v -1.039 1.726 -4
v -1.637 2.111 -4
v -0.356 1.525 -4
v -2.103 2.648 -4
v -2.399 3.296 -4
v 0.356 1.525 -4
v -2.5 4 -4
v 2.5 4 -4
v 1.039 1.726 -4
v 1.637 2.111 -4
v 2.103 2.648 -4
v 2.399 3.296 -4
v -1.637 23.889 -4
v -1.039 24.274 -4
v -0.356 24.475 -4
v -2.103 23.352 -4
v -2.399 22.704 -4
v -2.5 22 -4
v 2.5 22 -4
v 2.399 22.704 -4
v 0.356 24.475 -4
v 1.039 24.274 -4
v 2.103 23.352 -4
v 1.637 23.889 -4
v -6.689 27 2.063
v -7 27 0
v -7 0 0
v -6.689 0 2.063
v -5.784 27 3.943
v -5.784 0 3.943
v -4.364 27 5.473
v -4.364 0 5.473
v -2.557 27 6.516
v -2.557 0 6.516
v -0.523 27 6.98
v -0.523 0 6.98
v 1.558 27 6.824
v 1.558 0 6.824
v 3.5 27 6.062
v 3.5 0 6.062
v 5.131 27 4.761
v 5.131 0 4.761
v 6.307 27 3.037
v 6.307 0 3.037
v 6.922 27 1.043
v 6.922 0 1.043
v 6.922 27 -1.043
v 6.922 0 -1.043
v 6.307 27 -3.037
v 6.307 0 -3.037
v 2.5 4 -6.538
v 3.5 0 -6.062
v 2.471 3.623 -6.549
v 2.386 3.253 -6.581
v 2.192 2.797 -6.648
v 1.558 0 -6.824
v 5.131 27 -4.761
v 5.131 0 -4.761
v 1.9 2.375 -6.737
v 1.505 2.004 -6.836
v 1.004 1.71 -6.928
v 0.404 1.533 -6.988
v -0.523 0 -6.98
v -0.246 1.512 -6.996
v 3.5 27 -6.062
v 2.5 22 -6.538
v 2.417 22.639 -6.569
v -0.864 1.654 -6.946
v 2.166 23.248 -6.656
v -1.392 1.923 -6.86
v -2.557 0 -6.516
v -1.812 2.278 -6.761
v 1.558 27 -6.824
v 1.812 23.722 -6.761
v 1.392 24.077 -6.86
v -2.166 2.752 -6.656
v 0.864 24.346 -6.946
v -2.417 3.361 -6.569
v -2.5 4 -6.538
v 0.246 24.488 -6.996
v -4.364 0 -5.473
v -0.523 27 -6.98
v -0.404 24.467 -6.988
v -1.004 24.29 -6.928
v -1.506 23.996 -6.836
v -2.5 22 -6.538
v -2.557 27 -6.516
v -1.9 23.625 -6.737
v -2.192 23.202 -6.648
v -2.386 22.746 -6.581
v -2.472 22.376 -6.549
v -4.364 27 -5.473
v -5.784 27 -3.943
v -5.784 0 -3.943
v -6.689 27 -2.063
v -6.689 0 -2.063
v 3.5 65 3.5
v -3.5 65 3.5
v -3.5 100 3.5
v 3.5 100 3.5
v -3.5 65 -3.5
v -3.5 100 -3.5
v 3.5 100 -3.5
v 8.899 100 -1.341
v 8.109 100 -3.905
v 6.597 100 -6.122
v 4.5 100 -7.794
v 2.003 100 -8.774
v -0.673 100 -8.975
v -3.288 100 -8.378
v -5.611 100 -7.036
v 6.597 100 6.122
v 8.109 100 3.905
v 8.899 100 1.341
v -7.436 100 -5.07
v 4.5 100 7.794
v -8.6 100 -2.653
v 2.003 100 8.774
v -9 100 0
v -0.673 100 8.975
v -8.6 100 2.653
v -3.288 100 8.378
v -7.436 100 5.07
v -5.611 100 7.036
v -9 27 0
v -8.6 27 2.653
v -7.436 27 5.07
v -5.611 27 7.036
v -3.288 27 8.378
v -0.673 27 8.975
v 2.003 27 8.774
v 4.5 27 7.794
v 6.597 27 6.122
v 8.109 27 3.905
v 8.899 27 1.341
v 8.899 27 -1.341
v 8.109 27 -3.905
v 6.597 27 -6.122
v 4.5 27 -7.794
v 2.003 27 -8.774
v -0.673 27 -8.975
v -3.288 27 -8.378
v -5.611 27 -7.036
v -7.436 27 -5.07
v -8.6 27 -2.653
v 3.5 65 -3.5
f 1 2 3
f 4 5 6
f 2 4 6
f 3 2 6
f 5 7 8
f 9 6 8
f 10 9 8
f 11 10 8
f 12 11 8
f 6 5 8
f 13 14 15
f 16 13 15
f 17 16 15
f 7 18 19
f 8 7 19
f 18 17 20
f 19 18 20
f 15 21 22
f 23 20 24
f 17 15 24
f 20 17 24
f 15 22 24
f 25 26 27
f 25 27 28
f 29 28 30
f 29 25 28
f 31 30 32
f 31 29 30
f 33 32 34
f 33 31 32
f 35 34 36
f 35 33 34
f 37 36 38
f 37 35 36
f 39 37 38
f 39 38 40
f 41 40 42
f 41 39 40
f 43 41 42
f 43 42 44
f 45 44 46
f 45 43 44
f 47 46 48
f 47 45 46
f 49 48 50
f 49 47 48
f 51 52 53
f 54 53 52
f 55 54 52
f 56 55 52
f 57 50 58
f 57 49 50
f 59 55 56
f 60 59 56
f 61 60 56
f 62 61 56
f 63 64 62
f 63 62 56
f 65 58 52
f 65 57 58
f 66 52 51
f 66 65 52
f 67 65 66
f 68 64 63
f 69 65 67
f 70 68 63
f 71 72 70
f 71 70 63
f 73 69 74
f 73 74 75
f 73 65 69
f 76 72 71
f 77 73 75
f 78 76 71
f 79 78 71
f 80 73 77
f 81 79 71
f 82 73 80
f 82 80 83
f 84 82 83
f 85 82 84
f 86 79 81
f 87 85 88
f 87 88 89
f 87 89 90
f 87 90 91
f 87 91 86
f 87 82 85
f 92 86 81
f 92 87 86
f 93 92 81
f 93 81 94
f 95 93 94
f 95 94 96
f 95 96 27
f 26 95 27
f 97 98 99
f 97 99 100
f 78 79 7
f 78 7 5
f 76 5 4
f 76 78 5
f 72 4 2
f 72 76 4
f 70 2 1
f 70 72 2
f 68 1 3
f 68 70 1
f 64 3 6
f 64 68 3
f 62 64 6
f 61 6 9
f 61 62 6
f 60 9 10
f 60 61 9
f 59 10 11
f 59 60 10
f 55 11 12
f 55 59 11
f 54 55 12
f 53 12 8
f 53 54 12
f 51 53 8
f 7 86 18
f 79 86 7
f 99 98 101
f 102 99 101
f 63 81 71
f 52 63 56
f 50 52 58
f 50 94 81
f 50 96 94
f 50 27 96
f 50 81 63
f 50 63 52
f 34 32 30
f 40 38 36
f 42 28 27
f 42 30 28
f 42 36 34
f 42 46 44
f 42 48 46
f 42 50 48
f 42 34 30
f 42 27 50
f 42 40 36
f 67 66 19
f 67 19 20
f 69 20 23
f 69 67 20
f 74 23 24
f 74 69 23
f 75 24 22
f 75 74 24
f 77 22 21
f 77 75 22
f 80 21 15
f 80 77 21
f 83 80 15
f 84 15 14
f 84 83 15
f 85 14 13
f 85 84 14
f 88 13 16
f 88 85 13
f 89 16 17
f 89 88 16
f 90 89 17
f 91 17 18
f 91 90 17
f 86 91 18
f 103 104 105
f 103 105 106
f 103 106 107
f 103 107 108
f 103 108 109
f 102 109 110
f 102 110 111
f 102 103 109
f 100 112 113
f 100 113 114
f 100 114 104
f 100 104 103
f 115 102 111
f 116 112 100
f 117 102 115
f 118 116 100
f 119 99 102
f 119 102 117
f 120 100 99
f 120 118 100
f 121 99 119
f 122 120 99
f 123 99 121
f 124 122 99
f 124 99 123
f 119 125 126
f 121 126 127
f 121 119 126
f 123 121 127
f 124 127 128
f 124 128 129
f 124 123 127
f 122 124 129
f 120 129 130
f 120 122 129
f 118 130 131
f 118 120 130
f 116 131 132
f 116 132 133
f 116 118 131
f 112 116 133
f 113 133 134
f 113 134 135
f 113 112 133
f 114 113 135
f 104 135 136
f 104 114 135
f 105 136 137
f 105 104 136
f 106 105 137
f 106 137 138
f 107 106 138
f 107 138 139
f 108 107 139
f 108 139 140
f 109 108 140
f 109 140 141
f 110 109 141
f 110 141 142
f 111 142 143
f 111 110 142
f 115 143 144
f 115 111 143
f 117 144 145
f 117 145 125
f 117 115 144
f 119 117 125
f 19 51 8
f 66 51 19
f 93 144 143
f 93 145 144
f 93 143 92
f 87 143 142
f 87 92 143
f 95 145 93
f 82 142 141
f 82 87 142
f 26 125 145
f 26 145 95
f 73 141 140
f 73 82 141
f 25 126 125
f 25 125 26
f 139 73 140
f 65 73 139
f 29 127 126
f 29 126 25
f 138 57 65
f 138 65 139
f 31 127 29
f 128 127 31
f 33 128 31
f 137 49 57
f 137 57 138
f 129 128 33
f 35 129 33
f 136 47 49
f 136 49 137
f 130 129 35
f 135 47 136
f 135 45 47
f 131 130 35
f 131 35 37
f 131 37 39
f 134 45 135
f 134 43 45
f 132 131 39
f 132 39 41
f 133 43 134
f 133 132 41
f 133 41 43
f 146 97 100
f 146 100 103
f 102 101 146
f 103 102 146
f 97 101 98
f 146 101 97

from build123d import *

# Parameters (mm, degrees)
SKETCH_2_W          = 7
SKETCH_2_H          = 7
CUT_EXTRUDE_1_DEPTH = 35
CUT_EXTRUDE_2_DEPTH = 3


with BuildPart() as part:
    # 草图1 → 旋转1 (revolve)
    with BuildSketch(Plane.XY):
        Polygon((0, 0), (-7, 0), (-7, 27), (-9, 27), (-9, 100), (0, 100), align=None)
    revolve(axis=Axis((0, 0, 0), (0, 1, 0)))

    # 草图2 → 切除-拉伸1 (cut)
    with BuildSketch(Plane(origin=(0, 100, 0), x_dir=(1, 0, 0), z_dir=(0, 1, 0))):
        Rectangle(SKETCH_2_W, SKETCH_2_H)
    extrude(amount=-CUT_EXTRUDE_1_DEPTH, mode=Mode.SUBTRACT)

    # 草图4 → 切除-拉伸2 (cut)
    with BuildSketch(Plane(origin=(0, 0, -7), x_dir=(-1, 0, 0), z_dir=(0, 0, -1))):
        with BuildLine():
            Line((-2.5, 4), (-2.5, 22))
            ThreePointArc((-2.5, 22), (0, 24.5), (2.5, 22))
            Line((2.5, 22), (2.5, 4))
            ThreePointArc((2.5, 4), (0, 1.5), (-2.5, 4))
        make_face()
    extrude(amount=-CUT_EXTRUDE_2_DEPTH, mode=Mode.SUBTRACT)


solid = part.part
